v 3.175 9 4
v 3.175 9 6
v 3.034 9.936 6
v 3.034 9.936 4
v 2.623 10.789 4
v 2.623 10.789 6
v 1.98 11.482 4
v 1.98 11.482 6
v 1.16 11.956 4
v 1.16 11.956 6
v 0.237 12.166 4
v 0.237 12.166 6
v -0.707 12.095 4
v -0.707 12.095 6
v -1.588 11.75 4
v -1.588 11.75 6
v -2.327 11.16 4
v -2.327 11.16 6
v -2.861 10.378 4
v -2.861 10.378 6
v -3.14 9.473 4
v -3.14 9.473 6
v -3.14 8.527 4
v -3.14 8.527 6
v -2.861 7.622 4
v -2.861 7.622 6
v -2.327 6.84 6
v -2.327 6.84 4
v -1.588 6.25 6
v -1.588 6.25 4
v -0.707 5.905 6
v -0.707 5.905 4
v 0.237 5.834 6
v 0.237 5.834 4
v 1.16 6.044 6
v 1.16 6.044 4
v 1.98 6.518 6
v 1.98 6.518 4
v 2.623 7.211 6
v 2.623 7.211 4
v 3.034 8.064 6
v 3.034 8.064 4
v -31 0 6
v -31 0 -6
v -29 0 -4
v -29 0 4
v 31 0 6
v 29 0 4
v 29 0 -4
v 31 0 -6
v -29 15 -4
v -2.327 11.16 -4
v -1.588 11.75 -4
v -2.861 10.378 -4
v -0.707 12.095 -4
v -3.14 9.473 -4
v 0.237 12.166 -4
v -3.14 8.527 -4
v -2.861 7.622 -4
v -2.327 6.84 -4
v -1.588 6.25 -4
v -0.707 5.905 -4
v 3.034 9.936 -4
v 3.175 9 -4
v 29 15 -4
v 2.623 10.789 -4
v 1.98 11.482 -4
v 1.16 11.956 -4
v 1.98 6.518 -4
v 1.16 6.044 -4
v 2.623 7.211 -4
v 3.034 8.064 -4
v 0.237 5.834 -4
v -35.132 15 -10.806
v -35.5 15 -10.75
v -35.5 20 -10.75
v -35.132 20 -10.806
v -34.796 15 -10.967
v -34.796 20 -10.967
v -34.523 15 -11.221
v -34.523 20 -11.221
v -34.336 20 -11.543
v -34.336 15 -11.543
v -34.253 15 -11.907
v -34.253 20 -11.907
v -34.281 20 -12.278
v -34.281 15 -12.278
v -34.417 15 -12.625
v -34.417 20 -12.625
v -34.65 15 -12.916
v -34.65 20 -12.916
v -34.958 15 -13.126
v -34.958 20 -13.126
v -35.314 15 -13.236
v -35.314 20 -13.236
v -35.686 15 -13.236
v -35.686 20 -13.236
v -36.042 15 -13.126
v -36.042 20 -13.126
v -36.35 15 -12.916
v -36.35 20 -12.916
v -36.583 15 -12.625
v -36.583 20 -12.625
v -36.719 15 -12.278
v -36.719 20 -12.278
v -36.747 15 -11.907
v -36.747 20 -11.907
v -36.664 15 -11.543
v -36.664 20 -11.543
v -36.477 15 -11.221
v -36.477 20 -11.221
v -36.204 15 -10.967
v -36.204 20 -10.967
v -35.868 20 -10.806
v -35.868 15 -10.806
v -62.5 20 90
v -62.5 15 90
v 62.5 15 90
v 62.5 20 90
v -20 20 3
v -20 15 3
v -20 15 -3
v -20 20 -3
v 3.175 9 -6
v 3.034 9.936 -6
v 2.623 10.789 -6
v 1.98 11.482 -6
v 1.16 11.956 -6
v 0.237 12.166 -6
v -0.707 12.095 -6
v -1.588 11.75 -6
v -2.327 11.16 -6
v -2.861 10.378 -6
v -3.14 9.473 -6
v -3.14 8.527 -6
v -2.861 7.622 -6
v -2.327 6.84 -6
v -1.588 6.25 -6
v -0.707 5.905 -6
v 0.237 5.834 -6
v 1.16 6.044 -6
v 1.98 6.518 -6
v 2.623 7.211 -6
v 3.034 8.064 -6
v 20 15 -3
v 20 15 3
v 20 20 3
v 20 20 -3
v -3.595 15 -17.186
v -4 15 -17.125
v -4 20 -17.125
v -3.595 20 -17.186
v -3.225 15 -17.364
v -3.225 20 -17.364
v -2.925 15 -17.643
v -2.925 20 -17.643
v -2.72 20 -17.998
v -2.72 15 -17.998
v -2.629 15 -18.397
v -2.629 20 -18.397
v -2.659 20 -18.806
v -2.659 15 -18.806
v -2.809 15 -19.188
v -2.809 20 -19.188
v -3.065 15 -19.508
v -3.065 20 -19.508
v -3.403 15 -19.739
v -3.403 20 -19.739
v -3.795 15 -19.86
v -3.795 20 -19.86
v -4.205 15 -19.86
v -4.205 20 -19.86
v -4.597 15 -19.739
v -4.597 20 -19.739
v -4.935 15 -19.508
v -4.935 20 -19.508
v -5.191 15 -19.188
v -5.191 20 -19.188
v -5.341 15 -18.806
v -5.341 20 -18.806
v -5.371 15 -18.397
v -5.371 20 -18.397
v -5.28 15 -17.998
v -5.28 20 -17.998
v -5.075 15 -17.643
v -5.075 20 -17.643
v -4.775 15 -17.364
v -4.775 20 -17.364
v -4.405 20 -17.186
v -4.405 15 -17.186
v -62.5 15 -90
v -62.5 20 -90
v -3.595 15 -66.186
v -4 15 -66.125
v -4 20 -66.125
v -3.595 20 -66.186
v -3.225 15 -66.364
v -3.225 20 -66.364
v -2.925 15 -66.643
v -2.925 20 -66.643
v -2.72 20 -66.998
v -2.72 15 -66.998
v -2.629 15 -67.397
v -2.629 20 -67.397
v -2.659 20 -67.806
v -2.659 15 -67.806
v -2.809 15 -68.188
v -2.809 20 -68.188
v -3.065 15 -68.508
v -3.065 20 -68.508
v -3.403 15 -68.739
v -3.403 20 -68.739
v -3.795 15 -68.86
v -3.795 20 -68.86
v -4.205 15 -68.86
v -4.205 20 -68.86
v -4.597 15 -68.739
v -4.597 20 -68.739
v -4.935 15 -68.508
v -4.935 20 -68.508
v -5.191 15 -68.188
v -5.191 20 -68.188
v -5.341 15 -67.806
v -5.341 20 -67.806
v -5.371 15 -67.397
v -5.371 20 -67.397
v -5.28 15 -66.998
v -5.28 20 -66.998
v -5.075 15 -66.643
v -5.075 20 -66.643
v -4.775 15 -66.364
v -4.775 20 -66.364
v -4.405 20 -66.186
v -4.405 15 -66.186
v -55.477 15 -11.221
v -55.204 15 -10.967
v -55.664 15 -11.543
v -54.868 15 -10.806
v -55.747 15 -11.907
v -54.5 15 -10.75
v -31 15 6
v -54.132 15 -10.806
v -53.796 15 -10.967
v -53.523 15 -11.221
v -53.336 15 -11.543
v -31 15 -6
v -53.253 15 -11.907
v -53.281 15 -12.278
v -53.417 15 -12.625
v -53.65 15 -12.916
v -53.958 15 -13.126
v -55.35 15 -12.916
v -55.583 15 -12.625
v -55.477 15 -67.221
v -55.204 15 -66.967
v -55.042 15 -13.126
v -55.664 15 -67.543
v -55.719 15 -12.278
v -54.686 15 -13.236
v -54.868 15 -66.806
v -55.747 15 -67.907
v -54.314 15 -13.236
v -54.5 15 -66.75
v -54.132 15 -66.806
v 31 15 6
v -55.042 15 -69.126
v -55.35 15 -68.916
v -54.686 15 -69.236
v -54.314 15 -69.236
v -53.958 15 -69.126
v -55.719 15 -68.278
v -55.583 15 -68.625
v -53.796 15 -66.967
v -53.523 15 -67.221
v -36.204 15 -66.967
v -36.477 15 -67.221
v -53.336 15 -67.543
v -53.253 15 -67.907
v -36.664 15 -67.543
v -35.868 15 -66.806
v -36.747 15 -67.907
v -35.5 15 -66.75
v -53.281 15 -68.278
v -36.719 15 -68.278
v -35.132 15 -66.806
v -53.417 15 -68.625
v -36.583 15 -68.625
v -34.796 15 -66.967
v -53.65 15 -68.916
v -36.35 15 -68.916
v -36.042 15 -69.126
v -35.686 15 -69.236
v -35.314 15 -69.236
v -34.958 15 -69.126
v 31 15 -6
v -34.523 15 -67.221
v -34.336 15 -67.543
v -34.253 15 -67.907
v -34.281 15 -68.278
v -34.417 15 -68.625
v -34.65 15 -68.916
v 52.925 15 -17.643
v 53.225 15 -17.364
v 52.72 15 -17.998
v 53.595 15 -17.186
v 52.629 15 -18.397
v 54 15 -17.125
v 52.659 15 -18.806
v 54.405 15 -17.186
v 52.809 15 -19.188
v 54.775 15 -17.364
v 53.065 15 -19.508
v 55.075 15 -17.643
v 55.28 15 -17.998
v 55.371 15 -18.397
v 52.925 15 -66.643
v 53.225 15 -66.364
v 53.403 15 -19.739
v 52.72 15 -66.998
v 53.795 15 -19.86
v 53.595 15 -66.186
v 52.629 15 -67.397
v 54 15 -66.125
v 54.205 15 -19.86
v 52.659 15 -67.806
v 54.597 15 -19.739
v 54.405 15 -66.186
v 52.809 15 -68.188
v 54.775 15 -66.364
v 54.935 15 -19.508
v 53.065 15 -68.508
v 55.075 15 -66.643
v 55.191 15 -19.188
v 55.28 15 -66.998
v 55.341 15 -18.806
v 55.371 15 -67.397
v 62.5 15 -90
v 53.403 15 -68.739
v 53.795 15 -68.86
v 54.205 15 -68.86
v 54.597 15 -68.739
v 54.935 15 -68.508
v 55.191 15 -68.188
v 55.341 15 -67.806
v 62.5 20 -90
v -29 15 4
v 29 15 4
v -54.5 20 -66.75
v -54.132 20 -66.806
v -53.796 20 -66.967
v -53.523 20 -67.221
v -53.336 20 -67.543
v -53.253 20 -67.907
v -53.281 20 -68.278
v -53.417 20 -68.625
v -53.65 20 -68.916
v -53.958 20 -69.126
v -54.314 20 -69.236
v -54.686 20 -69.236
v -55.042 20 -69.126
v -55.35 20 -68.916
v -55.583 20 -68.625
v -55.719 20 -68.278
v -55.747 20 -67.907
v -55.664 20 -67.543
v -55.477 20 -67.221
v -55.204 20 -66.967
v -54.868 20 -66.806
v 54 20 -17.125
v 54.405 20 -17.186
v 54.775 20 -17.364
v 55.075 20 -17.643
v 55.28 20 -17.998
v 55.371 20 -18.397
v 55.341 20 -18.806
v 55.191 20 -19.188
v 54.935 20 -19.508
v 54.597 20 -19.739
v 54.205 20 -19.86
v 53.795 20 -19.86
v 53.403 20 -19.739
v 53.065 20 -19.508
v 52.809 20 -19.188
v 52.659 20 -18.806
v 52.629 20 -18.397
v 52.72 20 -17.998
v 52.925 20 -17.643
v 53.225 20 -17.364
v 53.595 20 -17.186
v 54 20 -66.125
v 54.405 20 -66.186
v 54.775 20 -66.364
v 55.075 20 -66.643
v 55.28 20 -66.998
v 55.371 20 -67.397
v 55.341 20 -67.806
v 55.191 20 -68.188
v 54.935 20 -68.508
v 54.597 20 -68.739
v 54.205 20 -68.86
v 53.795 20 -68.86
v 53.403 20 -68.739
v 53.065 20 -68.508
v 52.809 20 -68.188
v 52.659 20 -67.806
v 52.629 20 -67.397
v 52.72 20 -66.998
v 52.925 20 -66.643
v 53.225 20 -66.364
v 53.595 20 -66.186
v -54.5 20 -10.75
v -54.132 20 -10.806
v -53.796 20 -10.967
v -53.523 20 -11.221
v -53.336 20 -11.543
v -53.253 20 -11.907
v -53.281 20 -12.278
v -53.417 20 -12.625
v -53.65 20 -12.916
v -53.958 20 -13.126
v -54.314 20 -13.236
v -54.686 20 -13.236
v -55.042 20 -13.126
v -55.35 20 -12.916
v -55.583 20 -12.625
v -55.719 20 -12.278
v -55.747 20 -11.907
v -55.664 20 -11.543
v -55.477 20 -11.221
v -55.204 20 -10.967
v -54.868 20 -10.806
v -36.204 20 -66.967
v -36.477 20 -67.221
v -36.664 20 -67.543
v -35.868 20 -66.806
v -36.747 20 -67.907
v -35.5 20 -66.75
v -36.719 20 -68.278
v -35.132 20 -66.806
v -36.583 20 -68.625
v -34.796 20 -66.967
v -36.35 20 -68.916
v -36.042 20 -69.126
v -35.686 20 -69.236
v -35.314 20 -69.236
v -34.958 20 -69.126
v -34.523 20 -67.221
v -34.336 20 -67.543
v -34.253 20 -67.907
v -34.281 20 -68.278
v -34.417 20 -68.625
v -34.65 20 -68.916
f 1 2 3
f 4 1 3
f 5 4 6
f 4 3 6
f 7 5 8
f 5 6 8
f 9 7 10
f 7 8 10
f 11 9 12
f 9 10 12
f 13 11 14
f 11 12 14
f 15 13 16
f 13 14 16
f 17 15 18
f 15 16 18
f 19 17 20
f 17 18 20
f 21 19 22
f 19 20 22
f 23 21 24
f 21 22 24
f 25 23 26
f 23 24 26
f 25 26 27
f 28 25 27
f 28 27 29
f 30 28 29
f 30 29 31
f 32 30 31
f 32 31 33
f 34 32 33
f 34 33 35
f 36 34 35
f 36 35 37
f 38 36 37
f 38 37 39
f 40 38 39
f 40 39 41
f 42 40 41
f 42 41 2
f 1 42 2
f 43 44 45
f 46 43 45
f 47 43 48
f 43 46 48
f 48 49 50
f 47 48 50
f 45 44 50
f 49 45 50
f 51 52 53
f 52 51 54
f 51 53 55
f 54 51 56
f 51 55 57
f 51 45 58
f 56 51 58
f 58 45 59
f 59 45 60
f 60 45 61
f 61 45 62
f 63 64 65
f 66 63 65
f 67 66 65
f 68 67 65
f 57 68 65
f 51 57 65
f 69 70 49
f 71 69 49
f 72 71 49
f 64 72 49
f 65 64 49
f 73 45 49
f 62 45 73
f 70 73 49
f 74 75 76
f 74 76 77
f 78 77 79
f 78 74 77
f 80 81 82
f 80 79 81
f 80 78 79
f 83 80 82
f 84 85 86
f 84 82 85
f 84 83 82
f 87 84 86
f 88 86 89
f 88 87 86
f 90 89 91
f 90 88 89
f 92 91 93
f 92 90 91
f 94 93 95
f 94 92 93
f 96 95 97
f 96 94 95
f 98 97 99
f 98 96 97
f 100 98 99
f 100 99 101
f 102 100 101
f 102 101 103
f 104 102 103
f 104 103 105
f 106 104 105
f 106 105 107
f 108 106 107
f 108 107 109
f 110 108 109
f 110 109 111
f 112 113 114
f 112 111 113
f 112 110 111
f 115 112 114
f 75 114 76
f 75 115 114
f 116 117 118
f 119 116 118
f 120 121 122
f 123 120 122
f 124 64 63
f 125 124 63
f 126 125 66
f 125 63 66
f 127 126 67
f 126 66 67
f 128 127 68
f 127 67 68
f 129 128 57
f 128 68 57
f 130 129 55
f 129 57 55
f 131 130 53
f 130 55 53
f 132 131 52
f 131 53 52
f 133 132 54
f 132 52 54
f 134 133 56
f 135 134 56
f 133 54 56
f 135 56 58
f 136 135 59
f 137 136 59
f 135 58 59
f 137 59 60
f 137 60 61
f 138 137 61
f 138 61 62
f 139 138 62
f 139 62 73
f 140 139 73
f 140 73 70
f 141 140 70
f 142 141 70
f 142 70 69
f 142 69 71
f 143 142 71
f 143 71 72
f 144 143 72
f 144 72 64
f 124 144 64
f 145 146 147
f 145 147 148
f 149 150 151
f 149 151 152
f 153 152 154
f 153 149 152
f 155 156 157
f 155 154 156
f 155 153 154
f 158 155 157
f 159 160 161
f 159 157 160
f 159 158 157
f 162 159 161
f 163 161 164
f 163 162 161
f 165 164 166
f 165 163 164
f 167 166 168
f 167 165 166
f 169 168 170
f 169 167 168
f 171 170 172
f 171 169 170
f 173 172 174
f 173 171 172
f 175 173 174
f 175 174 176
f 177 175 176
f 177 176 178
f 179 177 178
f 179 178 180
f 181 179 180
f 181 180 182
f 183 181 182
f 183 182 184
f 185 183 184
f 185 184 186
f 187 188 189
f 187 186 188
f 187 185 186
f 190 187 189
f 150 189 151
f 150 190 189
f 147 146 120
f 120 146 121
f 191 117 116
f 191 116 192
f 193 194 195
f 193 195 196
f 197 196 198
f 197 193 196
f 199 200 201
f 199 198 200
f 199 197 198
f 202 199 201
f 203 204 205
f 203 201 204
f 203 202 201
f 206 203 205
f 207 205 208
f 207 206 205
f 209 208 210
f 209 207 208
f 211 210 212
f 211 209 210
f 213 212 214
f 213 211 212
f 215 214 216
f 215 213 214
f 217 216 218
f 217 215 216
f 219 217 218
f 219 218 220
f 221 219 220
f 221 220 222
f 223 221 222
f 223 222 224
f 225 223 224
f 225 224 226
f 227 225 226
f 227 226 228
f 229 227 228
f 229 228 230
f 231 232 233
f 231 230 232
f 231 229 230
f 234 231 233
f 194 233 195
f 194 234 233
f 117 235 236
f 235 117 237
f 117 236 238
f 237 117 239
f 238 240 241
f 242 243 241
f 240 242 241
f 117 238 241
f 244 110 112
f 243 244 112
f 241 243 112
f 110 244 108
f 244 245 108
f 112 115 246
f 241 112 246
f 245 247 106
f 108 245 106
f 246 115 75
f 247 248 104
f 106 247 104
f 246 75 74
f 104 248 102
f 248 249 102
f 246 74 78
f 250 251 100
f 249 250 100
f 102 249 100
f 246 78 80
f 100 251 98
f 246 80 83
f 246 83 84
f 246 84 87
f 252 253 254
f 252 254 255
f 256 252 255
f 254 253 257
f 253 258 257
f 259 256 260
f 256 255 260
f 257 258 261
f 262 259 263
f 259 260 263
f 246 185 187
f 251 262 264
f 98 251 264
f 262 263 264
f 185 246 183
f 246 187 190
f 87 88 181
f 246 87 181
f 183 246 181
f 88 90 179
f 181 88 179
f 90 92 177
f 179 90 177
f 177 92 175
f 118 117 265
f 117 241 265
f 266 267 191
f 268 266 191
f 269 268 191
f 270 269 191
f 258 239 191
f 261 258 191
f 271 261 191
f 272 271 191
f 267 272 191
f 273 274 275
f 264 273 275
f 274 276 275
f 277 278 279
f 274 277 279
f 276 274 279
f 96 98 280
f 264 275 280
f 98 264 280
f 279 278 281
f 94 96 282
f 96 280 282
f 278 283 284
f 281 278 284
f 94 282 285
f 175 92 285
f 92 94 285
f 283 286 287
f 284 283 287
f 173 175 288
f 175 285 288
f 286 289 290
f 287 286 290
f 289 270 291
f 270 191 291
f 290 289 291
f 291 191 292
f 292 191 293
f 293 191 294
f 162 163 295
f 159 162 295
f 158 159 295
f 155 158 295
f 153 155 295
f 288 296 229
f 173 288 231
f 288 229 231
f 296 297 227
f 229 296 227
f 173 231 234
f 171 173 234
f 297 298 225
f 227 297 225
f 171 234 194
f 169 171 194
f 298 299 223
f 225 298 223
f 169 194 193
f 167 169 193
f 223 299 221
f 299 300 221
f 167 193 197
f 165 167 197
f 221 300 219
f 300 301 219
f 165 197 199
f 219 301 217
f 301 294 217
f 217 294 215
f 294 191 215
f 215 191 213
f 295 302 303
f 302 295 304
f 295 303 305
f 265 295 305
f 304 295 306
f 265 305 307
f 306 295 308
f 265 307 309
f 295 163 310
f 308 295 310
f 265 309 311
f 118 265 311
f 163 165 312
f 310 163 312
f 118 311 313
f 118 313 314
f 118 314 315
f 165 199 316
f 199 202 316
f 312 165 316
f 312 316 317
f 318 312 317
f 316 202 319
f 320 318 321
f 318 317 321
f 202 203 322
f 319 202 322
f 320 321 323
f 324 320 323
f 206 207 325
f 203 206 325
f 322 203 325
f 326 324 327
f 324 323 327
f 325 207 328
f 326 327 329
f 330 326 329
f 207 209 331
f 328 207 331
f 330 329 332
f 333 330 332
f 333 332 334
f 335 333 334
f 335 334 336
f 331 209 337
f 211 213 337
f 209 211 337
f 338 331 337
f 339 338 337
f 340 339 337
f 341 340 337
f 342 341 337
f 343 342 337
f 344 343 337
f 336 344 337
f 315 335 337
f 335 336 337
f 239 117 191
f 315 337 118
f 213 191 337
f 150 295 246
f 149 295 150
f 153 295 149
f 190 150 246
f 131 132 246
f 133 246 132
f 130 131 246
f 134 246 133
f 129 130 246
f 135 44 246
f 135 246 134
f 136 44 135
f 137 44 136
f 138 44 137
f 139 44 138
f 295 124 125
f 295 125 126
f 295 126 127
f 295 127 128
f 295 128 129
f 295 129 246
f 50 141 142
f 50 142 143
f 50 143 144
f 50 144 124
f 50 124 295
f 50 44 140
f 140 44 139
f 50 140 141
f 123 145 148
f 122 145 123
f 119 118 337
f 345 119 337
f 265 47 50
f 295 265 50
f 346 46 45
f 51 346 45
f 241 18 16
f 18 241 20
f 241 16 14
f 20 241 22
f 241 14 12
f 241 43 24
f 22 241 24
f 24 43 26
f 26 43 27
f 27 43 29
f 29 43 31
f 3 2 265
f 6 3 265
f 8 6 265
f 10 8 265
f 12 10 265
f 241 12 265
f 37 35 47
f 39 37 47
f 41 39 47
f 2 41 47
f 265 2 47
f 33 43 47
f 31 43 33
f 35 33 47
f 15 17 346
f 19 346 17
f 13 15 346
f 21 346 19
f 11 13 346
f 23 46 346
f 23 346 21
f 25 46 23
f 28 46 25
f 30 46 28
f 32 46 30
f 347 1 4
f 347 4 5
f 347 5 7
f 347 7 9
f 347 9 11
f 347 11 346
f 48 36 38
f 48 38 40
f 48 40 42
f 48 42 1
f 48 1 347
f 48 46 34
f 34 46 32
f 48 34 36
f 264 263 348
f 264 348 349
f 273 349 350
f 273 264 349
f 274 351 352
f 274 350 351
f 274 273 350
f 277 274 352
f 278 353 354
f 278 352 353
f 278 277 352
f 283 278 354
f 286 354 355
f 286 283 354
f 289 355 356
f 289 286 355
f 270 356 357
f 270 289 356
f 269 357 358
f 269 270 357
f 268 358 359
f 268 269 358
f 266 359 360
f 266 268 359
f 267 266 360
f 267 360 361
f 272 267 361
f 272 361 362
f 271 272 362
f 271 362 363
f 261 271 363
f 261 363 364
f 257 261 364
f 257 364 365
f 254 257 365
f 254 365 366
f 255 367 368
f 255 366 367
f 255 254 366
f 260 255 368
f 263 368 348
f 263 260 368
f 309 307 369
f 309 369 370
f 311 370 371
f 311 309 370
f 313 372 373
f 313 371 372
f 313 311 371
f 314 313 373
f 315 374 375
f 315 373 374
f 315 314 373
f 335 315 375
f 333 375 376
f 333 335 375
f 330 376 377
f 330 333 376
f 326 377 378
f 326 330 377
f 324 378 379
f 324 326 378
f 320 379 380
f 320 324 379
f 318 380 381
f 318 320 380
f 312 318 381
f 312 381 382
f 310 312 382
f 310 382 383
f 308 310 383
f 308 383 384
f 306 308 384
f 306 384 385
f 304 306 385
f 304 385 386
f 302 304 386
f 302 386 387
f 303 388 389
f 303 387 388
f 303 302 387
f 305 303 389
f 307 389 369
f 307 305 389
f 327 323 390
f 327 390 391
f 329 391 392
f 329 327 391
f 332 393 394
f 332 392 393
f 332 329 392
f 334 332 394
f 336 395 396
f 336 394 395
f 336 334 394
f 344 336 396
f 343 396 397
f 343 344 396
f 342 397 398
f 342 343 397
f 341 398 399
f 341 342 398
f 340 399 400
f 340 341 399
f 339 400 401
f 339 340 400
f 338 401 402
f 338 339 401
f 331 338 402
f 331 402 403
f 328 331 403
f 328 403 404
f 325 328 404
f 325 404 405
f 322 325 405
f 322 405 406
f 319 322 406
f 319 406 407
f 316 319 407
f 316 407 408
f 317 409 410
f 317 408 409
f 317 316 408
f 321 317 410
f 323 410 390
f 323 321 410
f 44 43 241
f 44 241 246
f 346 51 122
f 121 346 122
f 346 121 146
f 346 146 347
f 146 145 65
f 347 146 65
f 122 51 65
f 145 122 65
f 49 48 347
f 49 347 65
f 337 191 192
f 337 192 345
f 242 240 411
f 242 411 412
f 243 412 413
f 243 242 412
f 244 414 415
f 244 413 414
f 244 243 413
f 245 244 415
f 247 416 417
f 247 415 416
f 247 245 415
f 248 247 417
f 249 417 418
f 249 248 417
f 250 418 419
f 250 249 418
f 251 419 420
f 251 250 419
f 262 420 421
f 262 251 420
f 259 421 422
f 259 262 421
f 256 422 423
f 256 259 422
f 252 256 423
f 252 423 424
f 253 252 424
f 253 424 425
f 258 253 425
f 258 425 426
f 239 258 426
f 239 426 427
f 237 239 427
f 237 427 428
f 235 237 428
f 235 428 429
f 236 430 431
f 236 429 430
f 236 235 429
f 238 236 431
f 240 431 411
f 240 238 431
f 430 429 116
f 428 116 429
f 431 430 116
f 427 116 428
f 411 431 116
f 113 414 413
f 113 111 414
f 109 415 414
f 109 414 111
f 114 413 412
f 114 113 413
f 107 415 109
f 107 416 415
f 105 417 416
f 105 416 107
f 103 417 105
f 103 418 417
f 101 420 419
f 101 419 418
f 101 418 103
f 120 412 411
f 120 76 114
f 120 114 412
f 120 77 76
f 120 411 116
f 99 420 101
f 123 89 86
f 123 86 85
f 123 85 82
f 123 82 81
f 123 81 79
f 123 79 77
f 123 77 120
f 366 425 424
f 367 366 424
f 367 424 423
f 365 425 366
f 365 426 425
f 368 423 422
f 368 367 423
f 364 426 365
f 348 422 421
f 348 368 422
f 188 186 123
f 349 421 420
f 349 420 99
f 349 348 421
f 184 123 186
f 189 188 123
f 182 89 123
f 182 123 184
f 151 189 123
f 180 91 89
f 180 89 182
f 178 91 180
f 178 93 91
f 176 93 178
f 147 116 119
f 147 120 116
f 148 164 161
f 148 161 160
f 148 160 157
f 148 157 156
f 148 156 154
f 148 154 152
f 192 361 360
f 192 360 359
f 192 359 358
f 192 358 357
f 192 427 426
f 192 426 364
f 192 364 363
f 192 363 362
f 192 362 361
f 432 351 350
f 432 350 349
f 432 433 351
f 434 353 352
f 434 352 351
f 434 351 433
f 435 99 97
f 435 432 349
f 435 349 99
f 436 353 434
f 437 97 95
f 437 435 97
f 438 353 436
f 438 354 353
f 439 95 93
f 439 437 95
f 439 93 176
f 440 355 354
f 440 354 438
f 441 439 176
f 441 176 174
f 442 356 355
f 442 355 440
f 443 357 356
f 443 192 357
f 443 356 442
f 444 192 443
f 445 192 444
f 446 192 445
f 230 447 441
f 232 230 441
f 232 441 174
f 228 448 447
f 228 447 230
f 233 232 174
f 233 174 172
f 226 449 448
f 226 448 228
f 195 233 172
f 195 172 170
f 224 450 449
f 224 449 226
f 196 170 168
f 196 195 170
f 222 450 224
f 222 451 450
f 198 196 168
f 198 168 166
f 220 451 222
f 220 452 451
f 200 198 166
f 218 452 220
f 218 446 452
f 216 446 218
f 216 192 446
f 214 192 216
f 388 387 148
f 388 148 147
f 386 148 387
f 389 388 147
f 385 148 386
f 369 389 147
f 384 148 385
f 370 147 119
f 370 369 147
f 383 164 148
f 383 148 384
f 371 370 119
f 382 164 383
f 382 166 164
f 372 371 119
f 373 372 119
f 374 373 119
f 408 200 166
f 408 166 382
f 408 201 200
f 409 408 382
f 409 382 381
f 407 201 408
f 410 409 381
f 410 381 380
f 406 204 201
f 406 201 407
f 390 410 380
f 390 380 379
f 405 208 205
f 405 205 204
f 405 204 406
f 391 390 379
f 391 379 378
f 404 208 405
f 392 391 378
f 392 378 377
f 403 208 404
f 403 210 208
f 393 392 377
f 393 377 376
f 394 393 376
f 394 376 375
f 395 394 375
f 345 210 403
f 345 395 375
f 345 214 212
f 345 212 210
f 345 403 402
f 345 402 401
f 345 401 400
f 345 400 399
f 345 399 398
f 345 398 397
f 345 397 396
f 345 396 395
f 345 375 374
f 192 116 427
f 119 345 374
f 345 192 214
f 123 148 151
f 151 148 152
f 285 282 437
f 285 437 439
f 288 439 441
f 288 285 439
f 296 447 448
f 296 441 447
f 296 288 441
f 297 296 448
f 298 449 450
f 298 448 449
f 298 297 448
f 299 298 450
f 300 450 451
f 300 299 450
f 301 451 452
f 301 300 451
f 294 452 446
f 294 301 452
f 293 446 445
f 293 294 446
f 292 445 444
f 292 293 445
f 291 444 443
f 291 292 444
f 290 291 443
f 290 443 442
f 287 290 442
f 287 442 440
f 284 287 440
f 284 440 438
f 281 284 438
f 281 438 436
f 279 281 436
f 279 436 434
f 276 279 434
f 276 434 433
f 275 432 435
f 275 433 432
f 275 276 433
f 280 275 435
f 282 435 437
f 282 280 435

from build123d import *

# Parameters (mm, degrees)
ESQUISSE1_W                  = 62
ESQUISSE1_H                  = 12
ESQUISSE1_W_2                = 58
ESQUISSE1_H_2                = 8
BOSS_EXTRU_1_DEPTH           = 15
ESQUISSE2_R                  = 3.175
ENL_V_MAT_EXTRU_1_DEPTH      = 37.469165058
ESQUISSE3_W                  = 125
ESQUISSE3_H                  = 180
BOSS_EXTRU_2_DEPTH           = 5
ENL_V_MAT_EXTRU_3_REACH      = 112.595
ESQUISSE6_W                  = 40
ESQUISSE6_H                  = 6
ENL_V_MAT_EXTRU_4_DEPTH      = 112.38334705
ENL_V_MAT_EXTRU_4_DEPTH_BACK = 112.38334705
ESQUISSE8_R                  = 1.375
ENL_V_MAT_EXTRU_5_DEPTH      = 112.38334705
ENL_V_MAT_EXTRU_5_DEPTH_BACK = 112.38334705
ESQUISSE9_R                  = 1.25


with BuildPart() as part:
    # Esquisse1 → Boss.-Extru.1 (new body)
    with BuildSketch(Plane(origin=(0, 0, 0), x_dir=(1, 0, 0), z_dir=(0, 1, 0))):
        Rectangle(ESQUISSE1_W, ESQUISSE1_H)
        Rectangle(ESQUISSE1_W_2, ESQUISSE1_H_2, mode=Mode.SUBTRACT)
    extrude(amount=BOSS_EXTRU_1_DEPTH)

    # Esquisse2 → Enlèv. mat.-Extru.1 (cut, through all)
    with BuildSketch(Plane.XY.offset(6)):
        with Locations((0, 9)):
            Circle(ESQUISSE2_R)
    extrude(amount=-ENL_V_MAT_EXTRU_1_DEPTH, mode=Mode.SUBTRACT)

    # Esquisse3 → Boss.-Extru.2 (add)
    with BuildSketch(Plane(origin=(0, 15, 0), x_dir=(1, 0, 0), z_dir=(0, 1, 0))):
        Rectangle(ESQUISSE3_W, ESQUISSE3_H)
    extrude(amount=BOSS_EXTRU_2_DEPTH)

    # Esquisse6 → Enlèv. mat.-Extru.3 (cut, up to next)
    with BuildSketch(Plane(origin=(0, 15, 0), x_dir=(-1, 0, 0), z_dir=(0, -1, 0)), mode=Mode.PRIVATE) as enl_v_mat_extru_3_sk1:
        Rectangle(ESQUISSE6_W, ESQUISSE6_H)
    enl_v_mat_extru_3_tool1 = extrude(enl_v_mat_extru_3_sk1.sketch, amount=-ENL_V_MAT_EXTRU_3_REACH, mode=Mode.PRIVATE) & part.part
    add(enl_v_mat_extru_3_tool1.solids().sort_by_distance((0, 15, 0))[0], mode=Mode.SUBTRACT)

    # Esquisse8 → Enlèv. mat.-Extru.4 (cut, two sides: drawn at the far end of the back side and taken through both)
    with BuildSketch(Plane(origin=(0, 20, 0), x_dir=(1, 0, 0), z_dir=(0, 1, 0)).offset(-ENL_V_MAT_EXTRU_4_DEPTH_BACK)):
        with Locations(Location((54, 67.5, 0), (0, 0, 270))):
            Circle(ESQUISSE8_R)
        with Locations(Location((54, 18.5, 0), (0, 0, 270))):
            Circle(ESQUISSE8_R)
        with Locations(Location((-4, 67.5, 0), (0, 0, 270))):
            Circle(ESQUISSE8_R)
        with Locations(Location((-4, 18.5, 0), (0, 0, 270))):
            Circle(ESQUISSE8_R)
    extrude(amount=ENL_V_MAT_EXTRU_4_DEPTH + ENL_V_MAT_EXTRU_4_DEPTH_BACK, mode=Mode.SUBTRACT)

    # Esquisse9 → Enlèv. mat.-Extru.5 (cut, two sides: drawn at the far end of the back side and taken through both)
    with BuildSketch(Plane(origin=(0, 20, 0), x_dir=(1, 0, 0), z_dir=(0, 1, 0)).offset(-ENL_V_MAT_EXTRU_5_DEPTH_BACK)):
        with Locations(Location((-35.5, 68, 0), (0, 0, 270))):
            Circle(ESQUISSE9_R)
        with Locations(Location((-54.5, 68, 0), (0, 0, 270))):
            Circle(ESQUISSE9_R)
        with Locations(Location((-35.5, 12, 0), (0, 0, 270))):
            Circle(ESQUISSE9_R)
        with Locations(Location((-54.5, 12, 0), (0, 0, 270))):
            Circle(ESQUISSE9_R)
    extrude(amount=ENL_V_MAT_EXTRU_5_DEPTH + ENL_V_MAT_EXTRU_5_DEPTH_BACK, mode=Mode.SUBTRACT)


solid = part.part
